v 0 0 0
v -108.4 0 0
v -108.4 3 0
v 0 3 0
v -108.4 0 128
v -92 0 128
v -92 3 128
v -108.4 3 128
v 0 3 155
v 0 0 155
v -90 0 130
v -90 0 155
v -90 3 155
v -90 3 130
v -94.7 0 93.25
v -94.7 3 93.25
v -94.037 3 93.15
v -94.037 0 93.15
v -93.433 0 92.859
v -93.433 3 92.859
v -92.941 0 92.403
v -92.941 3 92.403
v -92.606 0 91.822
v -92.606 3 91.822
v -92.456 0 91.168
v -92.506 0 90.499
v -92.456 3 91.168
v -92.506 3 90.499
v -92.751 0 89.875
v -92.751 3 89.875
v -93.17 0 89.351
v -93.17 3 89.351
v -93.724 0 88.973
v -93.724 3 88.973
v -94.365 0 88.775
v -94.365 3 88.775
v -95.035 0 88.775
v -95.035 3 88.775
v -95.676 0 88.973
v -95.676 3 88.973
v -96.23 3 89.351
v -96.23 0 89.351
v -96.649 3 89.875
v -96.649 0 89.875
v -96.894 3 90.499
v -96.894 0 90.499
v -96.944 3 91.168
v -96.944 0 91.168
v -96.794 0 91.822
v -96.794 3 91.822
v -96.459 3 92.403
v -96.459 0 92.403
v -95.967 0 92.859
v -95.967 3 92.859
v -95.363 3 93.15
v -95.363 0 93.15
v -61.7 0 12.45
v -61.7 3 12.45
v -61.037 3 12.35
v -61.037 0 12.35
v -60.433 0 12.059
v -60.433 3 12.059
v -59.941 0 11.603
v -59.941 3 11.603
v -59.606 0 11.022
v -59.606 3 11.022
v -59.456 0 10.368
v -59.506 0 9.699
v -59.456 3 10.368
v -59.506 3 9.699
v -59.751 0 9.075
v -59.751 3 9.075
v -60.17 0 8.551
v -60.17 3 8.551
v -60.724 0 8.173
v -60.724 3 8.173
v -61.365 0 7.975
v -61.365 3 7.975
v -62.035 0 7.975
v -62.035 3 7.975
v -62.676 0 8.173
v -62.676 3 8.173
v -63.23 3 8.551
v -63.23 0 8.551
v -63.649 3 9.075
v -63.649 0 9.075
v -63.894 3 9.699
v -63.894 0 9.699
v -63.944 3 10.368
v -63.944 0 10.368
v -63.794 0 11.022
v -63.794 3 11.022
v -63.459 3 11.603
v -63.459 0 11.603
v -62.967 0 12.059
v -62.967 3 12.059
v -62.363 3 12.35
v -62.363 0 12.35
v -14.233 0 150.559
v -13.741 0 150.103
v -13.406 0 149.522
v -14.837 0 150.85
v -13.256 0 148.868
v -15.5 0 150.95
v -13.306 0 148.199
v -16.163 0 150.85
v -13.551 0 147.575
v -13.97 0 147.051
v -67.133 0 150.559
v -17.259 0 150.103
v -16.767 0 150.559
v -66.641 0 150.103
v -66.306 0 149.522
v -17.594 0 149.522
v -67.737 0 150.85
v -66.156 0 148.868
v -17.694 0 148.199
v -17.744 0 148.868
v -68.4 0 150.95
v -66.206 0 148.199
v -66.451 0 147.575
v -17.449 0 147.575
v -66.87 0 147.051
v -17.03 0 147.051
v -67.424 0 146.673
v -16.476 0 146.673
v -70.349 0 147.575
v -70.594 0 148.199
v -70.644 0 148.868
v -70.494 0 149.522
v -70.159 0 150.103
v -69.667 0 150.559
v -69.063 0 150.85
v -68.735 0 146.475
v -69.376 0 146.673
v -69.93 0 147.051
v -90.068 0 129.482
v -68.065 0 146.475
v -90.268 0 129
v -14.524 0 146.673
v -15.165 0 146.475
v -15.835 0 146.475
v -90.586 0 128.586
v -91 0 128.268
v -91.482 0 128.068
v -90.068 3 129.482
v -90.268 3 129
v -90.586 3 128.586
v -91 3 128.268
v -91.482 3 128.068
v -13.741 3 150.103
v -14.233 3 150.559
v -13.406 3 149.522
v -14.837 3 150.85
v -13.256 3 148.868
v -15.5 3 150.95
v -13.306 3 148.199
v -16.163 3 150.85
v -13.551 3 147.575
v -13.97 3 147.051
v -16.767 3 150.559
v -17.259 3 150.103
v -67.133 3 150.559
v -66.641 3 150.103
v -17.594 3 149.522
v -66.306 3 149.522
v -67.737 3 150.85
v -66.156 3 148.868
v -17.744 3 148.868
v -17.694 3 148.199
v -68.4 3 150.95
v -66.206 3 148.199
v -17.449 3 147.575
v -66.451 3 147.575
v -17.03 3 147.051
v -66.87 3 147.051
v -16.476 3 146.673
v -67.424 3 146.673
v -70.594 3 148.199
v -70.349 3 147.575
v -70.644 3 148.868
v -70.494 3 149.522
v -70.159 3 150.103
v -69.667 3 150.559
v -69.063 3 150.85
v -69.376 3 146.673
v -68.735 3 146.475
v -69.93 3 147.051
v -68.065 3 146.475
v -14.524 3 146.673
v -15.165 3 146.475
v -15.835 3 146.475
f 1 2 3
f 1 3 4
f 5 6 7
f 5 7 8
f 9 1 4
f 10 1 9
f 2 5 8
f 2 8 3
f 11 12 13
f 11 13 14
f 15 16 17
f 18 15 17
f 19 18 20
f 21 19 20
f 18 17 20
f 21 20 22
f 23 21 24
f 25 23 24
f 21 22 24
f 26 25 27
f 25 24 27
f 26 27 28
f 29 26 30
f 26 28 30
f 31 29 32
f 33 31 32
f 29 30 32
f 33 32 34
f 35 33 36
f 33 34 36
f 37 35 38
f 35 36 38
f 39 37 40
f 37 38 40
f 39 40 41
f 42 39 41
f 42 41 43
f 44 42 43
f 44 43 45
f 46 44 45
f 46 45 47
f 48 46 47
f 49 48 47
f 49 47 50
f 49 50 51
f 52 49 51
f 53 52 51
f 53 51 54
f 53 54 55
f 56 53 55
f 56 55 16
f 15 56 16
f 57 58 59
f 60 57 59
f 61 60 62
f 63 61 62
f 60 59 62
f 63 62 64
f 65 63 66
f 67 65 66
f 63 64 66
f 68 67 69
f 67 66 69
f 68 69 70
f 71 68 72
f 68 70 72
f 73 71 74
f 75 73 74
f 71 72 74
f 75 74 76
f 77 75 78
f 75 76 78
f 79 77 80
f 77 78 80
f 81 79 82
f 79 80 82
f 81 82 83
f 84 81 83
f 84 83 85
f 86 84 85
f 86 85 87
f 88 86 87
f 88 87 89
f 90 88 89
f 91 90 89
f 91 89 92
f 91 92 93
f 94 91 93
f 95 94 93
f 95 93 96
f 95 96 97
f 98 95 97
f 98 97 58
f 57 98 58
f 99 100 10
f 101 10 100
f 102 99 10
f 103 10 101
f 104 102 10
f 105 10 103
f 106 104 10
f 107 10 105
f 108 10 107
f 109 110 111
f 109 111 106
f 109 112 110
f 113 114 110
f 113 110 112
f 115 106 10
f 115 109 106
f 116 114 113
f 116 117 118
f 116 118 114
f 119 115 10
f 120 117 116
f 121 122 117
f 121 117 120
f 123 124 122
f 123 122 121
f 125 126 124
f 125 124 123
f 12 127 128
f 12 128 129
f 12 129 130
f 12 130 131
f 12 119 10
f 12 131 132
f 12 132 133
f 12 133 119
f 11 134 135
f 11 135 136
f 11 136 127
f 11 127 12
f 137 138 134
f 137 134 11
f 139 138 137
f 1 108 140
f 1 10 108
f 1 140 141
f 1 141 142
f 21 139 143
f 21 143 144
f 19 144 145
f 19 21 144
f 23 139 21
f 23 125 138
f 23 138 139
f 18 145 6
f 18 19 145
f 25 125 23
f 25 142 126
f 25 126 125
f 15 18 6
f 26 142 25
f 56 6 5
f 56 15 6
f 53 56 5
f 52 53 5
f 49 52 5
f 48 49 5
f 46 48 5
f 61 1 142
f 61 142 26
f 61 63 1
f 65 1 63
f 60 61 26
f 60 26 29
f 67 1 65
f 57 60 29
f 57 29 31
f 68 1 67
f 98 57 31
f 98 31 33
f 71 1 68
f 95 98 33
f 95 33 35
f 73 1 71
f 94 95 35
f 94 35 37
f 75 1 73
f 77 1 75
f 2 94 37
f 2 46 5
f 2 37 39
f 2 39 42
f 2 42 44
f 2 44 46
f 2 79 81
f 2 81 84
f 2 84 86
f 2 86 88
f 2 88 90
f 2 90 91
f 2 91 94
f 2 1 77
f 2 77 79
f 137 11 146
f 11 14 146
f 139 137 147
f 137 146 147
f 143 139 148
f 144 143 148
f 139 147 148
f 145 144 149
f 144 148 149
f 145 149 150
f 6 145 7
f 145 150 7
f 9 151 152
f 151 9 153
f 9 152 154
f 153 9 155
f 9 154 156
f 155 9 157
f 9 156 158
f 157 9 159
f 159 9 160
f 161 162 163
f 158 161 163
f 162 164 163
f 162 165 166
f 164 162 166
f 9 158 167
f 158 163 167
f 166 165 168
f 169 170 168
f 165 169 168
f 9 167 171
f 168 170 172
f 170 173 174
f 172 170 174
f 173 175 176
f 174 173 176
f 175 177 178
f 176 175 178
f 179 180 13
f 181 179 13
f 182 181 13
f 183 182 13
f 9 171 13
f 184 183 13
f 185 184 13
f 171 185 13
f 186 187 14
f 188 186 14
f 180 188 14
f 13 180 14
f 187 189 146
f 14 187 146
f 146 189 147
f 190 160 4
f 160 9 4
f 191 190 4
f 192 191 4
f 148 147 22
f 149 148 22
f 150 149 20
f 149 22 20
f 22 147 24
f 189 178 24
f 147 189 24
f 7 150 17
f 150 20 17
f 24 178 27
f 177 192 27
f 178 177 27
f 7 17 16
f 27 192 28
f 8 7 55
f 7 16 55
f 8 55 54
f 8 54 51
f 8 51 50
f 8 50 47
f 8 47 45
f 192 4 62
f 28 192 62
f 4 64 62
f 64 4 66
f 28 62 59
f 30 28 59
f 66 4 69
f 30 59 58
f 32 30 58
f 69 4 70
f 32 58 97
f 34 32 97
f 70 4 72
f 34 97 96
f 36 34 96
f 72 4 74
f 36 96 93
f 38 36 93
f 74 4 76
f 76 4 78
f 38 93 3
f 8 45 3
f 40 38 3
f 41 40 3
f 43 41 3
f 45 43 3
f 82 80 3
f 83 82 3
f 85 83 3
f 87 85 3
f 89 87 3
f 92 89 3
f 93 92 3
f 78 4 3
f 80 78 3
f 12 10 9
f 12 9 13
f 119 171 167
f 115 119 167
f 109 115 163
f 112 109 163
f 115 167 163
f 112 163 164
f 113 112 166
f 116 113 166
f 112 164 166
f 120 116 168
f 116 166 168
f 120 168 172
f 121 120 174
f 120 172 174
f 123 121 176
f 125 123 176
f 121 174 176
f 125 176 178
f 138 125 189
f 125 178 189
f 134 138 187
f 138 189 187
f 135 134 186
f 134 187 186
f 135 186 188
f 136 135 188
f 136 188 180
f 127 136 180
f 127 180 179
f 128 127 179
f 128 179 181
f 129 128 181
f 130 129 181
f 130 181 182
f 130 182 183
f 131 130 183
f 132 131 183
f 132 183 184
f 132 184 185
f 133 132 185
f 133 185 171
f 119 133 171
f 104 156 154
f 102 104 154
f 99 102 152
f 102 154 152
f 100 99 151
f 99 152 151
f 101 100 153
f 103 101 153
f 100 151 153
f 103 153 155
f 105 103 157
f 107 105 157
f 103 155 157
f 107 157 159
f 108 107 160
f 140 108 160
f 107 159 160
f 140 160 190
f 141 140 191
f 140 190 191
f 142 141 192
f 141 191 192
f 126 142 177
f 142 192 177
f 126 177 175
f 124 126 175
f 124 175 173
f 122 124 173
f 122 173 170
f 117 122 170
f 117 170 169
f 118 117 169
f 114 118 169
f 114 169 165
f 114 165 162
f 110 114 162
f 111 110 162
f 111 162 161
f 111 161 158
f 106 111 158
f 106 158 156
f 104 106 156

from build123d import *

# Parameters (mm, degrees)
BOSS_EXTRUDE1_DEPTH = 3
SKETCH2_R           = 2.25
CUT_EXTRUDE1_DEPTH  = 190.168073416
FILLET1_R           = 2


with BuildPart() as part:
    # Sketch1 → Boss-Extrude1 (new body)
    with BuildSketch(Plane(origin=(0, 0, 0), x_dir=(1, 0, 0), z_dir=(0, 1, 0))):
        Polygon((0, 0), (0, -155), (-90, -155), (-90, -128), (-108.4, -128), (-108.4, 0), align=None)
    extrude(amount=BOSS_EXTRUDE1_DEPTH)

    # Sketch2 → Cut-Extrude1 (cut, through all)
    with BuildSketch(Plane(origin=(0, 3, 0), x_dir=(1, 0, 0), z_dir=(0, 1, 0))):
        with Locations(Location((-68.4, -148.7, 0), (0, 0, 270))):
            Circle(SKETCH2_R)
        with Locations(Location((-15.5, -148.7, 0), (0, 0, 270))):
            Circle(SKETCH2_R)
        with Locations(Location((-94.7, -91, 0), (0, 0, 270))):
            Circle(SKETCH2_R)
        with Locations(Location((-61.7, -10.2, 0), (0, 0, 270))):
            Circle(SKETCH2_R)
    extrude(amount=-CUT_EXTRUDE1_DEPTH, mode=Mode.SUBTRACT)

    # Fillet1
    fillet1_edges = [part.edges().sort_by_distance(p)[0] for p in [
        (-90, 1.5, 128),
    ]]
    fillet(fillet1_edges, radius=FILLET1_R)


solid = part.part
